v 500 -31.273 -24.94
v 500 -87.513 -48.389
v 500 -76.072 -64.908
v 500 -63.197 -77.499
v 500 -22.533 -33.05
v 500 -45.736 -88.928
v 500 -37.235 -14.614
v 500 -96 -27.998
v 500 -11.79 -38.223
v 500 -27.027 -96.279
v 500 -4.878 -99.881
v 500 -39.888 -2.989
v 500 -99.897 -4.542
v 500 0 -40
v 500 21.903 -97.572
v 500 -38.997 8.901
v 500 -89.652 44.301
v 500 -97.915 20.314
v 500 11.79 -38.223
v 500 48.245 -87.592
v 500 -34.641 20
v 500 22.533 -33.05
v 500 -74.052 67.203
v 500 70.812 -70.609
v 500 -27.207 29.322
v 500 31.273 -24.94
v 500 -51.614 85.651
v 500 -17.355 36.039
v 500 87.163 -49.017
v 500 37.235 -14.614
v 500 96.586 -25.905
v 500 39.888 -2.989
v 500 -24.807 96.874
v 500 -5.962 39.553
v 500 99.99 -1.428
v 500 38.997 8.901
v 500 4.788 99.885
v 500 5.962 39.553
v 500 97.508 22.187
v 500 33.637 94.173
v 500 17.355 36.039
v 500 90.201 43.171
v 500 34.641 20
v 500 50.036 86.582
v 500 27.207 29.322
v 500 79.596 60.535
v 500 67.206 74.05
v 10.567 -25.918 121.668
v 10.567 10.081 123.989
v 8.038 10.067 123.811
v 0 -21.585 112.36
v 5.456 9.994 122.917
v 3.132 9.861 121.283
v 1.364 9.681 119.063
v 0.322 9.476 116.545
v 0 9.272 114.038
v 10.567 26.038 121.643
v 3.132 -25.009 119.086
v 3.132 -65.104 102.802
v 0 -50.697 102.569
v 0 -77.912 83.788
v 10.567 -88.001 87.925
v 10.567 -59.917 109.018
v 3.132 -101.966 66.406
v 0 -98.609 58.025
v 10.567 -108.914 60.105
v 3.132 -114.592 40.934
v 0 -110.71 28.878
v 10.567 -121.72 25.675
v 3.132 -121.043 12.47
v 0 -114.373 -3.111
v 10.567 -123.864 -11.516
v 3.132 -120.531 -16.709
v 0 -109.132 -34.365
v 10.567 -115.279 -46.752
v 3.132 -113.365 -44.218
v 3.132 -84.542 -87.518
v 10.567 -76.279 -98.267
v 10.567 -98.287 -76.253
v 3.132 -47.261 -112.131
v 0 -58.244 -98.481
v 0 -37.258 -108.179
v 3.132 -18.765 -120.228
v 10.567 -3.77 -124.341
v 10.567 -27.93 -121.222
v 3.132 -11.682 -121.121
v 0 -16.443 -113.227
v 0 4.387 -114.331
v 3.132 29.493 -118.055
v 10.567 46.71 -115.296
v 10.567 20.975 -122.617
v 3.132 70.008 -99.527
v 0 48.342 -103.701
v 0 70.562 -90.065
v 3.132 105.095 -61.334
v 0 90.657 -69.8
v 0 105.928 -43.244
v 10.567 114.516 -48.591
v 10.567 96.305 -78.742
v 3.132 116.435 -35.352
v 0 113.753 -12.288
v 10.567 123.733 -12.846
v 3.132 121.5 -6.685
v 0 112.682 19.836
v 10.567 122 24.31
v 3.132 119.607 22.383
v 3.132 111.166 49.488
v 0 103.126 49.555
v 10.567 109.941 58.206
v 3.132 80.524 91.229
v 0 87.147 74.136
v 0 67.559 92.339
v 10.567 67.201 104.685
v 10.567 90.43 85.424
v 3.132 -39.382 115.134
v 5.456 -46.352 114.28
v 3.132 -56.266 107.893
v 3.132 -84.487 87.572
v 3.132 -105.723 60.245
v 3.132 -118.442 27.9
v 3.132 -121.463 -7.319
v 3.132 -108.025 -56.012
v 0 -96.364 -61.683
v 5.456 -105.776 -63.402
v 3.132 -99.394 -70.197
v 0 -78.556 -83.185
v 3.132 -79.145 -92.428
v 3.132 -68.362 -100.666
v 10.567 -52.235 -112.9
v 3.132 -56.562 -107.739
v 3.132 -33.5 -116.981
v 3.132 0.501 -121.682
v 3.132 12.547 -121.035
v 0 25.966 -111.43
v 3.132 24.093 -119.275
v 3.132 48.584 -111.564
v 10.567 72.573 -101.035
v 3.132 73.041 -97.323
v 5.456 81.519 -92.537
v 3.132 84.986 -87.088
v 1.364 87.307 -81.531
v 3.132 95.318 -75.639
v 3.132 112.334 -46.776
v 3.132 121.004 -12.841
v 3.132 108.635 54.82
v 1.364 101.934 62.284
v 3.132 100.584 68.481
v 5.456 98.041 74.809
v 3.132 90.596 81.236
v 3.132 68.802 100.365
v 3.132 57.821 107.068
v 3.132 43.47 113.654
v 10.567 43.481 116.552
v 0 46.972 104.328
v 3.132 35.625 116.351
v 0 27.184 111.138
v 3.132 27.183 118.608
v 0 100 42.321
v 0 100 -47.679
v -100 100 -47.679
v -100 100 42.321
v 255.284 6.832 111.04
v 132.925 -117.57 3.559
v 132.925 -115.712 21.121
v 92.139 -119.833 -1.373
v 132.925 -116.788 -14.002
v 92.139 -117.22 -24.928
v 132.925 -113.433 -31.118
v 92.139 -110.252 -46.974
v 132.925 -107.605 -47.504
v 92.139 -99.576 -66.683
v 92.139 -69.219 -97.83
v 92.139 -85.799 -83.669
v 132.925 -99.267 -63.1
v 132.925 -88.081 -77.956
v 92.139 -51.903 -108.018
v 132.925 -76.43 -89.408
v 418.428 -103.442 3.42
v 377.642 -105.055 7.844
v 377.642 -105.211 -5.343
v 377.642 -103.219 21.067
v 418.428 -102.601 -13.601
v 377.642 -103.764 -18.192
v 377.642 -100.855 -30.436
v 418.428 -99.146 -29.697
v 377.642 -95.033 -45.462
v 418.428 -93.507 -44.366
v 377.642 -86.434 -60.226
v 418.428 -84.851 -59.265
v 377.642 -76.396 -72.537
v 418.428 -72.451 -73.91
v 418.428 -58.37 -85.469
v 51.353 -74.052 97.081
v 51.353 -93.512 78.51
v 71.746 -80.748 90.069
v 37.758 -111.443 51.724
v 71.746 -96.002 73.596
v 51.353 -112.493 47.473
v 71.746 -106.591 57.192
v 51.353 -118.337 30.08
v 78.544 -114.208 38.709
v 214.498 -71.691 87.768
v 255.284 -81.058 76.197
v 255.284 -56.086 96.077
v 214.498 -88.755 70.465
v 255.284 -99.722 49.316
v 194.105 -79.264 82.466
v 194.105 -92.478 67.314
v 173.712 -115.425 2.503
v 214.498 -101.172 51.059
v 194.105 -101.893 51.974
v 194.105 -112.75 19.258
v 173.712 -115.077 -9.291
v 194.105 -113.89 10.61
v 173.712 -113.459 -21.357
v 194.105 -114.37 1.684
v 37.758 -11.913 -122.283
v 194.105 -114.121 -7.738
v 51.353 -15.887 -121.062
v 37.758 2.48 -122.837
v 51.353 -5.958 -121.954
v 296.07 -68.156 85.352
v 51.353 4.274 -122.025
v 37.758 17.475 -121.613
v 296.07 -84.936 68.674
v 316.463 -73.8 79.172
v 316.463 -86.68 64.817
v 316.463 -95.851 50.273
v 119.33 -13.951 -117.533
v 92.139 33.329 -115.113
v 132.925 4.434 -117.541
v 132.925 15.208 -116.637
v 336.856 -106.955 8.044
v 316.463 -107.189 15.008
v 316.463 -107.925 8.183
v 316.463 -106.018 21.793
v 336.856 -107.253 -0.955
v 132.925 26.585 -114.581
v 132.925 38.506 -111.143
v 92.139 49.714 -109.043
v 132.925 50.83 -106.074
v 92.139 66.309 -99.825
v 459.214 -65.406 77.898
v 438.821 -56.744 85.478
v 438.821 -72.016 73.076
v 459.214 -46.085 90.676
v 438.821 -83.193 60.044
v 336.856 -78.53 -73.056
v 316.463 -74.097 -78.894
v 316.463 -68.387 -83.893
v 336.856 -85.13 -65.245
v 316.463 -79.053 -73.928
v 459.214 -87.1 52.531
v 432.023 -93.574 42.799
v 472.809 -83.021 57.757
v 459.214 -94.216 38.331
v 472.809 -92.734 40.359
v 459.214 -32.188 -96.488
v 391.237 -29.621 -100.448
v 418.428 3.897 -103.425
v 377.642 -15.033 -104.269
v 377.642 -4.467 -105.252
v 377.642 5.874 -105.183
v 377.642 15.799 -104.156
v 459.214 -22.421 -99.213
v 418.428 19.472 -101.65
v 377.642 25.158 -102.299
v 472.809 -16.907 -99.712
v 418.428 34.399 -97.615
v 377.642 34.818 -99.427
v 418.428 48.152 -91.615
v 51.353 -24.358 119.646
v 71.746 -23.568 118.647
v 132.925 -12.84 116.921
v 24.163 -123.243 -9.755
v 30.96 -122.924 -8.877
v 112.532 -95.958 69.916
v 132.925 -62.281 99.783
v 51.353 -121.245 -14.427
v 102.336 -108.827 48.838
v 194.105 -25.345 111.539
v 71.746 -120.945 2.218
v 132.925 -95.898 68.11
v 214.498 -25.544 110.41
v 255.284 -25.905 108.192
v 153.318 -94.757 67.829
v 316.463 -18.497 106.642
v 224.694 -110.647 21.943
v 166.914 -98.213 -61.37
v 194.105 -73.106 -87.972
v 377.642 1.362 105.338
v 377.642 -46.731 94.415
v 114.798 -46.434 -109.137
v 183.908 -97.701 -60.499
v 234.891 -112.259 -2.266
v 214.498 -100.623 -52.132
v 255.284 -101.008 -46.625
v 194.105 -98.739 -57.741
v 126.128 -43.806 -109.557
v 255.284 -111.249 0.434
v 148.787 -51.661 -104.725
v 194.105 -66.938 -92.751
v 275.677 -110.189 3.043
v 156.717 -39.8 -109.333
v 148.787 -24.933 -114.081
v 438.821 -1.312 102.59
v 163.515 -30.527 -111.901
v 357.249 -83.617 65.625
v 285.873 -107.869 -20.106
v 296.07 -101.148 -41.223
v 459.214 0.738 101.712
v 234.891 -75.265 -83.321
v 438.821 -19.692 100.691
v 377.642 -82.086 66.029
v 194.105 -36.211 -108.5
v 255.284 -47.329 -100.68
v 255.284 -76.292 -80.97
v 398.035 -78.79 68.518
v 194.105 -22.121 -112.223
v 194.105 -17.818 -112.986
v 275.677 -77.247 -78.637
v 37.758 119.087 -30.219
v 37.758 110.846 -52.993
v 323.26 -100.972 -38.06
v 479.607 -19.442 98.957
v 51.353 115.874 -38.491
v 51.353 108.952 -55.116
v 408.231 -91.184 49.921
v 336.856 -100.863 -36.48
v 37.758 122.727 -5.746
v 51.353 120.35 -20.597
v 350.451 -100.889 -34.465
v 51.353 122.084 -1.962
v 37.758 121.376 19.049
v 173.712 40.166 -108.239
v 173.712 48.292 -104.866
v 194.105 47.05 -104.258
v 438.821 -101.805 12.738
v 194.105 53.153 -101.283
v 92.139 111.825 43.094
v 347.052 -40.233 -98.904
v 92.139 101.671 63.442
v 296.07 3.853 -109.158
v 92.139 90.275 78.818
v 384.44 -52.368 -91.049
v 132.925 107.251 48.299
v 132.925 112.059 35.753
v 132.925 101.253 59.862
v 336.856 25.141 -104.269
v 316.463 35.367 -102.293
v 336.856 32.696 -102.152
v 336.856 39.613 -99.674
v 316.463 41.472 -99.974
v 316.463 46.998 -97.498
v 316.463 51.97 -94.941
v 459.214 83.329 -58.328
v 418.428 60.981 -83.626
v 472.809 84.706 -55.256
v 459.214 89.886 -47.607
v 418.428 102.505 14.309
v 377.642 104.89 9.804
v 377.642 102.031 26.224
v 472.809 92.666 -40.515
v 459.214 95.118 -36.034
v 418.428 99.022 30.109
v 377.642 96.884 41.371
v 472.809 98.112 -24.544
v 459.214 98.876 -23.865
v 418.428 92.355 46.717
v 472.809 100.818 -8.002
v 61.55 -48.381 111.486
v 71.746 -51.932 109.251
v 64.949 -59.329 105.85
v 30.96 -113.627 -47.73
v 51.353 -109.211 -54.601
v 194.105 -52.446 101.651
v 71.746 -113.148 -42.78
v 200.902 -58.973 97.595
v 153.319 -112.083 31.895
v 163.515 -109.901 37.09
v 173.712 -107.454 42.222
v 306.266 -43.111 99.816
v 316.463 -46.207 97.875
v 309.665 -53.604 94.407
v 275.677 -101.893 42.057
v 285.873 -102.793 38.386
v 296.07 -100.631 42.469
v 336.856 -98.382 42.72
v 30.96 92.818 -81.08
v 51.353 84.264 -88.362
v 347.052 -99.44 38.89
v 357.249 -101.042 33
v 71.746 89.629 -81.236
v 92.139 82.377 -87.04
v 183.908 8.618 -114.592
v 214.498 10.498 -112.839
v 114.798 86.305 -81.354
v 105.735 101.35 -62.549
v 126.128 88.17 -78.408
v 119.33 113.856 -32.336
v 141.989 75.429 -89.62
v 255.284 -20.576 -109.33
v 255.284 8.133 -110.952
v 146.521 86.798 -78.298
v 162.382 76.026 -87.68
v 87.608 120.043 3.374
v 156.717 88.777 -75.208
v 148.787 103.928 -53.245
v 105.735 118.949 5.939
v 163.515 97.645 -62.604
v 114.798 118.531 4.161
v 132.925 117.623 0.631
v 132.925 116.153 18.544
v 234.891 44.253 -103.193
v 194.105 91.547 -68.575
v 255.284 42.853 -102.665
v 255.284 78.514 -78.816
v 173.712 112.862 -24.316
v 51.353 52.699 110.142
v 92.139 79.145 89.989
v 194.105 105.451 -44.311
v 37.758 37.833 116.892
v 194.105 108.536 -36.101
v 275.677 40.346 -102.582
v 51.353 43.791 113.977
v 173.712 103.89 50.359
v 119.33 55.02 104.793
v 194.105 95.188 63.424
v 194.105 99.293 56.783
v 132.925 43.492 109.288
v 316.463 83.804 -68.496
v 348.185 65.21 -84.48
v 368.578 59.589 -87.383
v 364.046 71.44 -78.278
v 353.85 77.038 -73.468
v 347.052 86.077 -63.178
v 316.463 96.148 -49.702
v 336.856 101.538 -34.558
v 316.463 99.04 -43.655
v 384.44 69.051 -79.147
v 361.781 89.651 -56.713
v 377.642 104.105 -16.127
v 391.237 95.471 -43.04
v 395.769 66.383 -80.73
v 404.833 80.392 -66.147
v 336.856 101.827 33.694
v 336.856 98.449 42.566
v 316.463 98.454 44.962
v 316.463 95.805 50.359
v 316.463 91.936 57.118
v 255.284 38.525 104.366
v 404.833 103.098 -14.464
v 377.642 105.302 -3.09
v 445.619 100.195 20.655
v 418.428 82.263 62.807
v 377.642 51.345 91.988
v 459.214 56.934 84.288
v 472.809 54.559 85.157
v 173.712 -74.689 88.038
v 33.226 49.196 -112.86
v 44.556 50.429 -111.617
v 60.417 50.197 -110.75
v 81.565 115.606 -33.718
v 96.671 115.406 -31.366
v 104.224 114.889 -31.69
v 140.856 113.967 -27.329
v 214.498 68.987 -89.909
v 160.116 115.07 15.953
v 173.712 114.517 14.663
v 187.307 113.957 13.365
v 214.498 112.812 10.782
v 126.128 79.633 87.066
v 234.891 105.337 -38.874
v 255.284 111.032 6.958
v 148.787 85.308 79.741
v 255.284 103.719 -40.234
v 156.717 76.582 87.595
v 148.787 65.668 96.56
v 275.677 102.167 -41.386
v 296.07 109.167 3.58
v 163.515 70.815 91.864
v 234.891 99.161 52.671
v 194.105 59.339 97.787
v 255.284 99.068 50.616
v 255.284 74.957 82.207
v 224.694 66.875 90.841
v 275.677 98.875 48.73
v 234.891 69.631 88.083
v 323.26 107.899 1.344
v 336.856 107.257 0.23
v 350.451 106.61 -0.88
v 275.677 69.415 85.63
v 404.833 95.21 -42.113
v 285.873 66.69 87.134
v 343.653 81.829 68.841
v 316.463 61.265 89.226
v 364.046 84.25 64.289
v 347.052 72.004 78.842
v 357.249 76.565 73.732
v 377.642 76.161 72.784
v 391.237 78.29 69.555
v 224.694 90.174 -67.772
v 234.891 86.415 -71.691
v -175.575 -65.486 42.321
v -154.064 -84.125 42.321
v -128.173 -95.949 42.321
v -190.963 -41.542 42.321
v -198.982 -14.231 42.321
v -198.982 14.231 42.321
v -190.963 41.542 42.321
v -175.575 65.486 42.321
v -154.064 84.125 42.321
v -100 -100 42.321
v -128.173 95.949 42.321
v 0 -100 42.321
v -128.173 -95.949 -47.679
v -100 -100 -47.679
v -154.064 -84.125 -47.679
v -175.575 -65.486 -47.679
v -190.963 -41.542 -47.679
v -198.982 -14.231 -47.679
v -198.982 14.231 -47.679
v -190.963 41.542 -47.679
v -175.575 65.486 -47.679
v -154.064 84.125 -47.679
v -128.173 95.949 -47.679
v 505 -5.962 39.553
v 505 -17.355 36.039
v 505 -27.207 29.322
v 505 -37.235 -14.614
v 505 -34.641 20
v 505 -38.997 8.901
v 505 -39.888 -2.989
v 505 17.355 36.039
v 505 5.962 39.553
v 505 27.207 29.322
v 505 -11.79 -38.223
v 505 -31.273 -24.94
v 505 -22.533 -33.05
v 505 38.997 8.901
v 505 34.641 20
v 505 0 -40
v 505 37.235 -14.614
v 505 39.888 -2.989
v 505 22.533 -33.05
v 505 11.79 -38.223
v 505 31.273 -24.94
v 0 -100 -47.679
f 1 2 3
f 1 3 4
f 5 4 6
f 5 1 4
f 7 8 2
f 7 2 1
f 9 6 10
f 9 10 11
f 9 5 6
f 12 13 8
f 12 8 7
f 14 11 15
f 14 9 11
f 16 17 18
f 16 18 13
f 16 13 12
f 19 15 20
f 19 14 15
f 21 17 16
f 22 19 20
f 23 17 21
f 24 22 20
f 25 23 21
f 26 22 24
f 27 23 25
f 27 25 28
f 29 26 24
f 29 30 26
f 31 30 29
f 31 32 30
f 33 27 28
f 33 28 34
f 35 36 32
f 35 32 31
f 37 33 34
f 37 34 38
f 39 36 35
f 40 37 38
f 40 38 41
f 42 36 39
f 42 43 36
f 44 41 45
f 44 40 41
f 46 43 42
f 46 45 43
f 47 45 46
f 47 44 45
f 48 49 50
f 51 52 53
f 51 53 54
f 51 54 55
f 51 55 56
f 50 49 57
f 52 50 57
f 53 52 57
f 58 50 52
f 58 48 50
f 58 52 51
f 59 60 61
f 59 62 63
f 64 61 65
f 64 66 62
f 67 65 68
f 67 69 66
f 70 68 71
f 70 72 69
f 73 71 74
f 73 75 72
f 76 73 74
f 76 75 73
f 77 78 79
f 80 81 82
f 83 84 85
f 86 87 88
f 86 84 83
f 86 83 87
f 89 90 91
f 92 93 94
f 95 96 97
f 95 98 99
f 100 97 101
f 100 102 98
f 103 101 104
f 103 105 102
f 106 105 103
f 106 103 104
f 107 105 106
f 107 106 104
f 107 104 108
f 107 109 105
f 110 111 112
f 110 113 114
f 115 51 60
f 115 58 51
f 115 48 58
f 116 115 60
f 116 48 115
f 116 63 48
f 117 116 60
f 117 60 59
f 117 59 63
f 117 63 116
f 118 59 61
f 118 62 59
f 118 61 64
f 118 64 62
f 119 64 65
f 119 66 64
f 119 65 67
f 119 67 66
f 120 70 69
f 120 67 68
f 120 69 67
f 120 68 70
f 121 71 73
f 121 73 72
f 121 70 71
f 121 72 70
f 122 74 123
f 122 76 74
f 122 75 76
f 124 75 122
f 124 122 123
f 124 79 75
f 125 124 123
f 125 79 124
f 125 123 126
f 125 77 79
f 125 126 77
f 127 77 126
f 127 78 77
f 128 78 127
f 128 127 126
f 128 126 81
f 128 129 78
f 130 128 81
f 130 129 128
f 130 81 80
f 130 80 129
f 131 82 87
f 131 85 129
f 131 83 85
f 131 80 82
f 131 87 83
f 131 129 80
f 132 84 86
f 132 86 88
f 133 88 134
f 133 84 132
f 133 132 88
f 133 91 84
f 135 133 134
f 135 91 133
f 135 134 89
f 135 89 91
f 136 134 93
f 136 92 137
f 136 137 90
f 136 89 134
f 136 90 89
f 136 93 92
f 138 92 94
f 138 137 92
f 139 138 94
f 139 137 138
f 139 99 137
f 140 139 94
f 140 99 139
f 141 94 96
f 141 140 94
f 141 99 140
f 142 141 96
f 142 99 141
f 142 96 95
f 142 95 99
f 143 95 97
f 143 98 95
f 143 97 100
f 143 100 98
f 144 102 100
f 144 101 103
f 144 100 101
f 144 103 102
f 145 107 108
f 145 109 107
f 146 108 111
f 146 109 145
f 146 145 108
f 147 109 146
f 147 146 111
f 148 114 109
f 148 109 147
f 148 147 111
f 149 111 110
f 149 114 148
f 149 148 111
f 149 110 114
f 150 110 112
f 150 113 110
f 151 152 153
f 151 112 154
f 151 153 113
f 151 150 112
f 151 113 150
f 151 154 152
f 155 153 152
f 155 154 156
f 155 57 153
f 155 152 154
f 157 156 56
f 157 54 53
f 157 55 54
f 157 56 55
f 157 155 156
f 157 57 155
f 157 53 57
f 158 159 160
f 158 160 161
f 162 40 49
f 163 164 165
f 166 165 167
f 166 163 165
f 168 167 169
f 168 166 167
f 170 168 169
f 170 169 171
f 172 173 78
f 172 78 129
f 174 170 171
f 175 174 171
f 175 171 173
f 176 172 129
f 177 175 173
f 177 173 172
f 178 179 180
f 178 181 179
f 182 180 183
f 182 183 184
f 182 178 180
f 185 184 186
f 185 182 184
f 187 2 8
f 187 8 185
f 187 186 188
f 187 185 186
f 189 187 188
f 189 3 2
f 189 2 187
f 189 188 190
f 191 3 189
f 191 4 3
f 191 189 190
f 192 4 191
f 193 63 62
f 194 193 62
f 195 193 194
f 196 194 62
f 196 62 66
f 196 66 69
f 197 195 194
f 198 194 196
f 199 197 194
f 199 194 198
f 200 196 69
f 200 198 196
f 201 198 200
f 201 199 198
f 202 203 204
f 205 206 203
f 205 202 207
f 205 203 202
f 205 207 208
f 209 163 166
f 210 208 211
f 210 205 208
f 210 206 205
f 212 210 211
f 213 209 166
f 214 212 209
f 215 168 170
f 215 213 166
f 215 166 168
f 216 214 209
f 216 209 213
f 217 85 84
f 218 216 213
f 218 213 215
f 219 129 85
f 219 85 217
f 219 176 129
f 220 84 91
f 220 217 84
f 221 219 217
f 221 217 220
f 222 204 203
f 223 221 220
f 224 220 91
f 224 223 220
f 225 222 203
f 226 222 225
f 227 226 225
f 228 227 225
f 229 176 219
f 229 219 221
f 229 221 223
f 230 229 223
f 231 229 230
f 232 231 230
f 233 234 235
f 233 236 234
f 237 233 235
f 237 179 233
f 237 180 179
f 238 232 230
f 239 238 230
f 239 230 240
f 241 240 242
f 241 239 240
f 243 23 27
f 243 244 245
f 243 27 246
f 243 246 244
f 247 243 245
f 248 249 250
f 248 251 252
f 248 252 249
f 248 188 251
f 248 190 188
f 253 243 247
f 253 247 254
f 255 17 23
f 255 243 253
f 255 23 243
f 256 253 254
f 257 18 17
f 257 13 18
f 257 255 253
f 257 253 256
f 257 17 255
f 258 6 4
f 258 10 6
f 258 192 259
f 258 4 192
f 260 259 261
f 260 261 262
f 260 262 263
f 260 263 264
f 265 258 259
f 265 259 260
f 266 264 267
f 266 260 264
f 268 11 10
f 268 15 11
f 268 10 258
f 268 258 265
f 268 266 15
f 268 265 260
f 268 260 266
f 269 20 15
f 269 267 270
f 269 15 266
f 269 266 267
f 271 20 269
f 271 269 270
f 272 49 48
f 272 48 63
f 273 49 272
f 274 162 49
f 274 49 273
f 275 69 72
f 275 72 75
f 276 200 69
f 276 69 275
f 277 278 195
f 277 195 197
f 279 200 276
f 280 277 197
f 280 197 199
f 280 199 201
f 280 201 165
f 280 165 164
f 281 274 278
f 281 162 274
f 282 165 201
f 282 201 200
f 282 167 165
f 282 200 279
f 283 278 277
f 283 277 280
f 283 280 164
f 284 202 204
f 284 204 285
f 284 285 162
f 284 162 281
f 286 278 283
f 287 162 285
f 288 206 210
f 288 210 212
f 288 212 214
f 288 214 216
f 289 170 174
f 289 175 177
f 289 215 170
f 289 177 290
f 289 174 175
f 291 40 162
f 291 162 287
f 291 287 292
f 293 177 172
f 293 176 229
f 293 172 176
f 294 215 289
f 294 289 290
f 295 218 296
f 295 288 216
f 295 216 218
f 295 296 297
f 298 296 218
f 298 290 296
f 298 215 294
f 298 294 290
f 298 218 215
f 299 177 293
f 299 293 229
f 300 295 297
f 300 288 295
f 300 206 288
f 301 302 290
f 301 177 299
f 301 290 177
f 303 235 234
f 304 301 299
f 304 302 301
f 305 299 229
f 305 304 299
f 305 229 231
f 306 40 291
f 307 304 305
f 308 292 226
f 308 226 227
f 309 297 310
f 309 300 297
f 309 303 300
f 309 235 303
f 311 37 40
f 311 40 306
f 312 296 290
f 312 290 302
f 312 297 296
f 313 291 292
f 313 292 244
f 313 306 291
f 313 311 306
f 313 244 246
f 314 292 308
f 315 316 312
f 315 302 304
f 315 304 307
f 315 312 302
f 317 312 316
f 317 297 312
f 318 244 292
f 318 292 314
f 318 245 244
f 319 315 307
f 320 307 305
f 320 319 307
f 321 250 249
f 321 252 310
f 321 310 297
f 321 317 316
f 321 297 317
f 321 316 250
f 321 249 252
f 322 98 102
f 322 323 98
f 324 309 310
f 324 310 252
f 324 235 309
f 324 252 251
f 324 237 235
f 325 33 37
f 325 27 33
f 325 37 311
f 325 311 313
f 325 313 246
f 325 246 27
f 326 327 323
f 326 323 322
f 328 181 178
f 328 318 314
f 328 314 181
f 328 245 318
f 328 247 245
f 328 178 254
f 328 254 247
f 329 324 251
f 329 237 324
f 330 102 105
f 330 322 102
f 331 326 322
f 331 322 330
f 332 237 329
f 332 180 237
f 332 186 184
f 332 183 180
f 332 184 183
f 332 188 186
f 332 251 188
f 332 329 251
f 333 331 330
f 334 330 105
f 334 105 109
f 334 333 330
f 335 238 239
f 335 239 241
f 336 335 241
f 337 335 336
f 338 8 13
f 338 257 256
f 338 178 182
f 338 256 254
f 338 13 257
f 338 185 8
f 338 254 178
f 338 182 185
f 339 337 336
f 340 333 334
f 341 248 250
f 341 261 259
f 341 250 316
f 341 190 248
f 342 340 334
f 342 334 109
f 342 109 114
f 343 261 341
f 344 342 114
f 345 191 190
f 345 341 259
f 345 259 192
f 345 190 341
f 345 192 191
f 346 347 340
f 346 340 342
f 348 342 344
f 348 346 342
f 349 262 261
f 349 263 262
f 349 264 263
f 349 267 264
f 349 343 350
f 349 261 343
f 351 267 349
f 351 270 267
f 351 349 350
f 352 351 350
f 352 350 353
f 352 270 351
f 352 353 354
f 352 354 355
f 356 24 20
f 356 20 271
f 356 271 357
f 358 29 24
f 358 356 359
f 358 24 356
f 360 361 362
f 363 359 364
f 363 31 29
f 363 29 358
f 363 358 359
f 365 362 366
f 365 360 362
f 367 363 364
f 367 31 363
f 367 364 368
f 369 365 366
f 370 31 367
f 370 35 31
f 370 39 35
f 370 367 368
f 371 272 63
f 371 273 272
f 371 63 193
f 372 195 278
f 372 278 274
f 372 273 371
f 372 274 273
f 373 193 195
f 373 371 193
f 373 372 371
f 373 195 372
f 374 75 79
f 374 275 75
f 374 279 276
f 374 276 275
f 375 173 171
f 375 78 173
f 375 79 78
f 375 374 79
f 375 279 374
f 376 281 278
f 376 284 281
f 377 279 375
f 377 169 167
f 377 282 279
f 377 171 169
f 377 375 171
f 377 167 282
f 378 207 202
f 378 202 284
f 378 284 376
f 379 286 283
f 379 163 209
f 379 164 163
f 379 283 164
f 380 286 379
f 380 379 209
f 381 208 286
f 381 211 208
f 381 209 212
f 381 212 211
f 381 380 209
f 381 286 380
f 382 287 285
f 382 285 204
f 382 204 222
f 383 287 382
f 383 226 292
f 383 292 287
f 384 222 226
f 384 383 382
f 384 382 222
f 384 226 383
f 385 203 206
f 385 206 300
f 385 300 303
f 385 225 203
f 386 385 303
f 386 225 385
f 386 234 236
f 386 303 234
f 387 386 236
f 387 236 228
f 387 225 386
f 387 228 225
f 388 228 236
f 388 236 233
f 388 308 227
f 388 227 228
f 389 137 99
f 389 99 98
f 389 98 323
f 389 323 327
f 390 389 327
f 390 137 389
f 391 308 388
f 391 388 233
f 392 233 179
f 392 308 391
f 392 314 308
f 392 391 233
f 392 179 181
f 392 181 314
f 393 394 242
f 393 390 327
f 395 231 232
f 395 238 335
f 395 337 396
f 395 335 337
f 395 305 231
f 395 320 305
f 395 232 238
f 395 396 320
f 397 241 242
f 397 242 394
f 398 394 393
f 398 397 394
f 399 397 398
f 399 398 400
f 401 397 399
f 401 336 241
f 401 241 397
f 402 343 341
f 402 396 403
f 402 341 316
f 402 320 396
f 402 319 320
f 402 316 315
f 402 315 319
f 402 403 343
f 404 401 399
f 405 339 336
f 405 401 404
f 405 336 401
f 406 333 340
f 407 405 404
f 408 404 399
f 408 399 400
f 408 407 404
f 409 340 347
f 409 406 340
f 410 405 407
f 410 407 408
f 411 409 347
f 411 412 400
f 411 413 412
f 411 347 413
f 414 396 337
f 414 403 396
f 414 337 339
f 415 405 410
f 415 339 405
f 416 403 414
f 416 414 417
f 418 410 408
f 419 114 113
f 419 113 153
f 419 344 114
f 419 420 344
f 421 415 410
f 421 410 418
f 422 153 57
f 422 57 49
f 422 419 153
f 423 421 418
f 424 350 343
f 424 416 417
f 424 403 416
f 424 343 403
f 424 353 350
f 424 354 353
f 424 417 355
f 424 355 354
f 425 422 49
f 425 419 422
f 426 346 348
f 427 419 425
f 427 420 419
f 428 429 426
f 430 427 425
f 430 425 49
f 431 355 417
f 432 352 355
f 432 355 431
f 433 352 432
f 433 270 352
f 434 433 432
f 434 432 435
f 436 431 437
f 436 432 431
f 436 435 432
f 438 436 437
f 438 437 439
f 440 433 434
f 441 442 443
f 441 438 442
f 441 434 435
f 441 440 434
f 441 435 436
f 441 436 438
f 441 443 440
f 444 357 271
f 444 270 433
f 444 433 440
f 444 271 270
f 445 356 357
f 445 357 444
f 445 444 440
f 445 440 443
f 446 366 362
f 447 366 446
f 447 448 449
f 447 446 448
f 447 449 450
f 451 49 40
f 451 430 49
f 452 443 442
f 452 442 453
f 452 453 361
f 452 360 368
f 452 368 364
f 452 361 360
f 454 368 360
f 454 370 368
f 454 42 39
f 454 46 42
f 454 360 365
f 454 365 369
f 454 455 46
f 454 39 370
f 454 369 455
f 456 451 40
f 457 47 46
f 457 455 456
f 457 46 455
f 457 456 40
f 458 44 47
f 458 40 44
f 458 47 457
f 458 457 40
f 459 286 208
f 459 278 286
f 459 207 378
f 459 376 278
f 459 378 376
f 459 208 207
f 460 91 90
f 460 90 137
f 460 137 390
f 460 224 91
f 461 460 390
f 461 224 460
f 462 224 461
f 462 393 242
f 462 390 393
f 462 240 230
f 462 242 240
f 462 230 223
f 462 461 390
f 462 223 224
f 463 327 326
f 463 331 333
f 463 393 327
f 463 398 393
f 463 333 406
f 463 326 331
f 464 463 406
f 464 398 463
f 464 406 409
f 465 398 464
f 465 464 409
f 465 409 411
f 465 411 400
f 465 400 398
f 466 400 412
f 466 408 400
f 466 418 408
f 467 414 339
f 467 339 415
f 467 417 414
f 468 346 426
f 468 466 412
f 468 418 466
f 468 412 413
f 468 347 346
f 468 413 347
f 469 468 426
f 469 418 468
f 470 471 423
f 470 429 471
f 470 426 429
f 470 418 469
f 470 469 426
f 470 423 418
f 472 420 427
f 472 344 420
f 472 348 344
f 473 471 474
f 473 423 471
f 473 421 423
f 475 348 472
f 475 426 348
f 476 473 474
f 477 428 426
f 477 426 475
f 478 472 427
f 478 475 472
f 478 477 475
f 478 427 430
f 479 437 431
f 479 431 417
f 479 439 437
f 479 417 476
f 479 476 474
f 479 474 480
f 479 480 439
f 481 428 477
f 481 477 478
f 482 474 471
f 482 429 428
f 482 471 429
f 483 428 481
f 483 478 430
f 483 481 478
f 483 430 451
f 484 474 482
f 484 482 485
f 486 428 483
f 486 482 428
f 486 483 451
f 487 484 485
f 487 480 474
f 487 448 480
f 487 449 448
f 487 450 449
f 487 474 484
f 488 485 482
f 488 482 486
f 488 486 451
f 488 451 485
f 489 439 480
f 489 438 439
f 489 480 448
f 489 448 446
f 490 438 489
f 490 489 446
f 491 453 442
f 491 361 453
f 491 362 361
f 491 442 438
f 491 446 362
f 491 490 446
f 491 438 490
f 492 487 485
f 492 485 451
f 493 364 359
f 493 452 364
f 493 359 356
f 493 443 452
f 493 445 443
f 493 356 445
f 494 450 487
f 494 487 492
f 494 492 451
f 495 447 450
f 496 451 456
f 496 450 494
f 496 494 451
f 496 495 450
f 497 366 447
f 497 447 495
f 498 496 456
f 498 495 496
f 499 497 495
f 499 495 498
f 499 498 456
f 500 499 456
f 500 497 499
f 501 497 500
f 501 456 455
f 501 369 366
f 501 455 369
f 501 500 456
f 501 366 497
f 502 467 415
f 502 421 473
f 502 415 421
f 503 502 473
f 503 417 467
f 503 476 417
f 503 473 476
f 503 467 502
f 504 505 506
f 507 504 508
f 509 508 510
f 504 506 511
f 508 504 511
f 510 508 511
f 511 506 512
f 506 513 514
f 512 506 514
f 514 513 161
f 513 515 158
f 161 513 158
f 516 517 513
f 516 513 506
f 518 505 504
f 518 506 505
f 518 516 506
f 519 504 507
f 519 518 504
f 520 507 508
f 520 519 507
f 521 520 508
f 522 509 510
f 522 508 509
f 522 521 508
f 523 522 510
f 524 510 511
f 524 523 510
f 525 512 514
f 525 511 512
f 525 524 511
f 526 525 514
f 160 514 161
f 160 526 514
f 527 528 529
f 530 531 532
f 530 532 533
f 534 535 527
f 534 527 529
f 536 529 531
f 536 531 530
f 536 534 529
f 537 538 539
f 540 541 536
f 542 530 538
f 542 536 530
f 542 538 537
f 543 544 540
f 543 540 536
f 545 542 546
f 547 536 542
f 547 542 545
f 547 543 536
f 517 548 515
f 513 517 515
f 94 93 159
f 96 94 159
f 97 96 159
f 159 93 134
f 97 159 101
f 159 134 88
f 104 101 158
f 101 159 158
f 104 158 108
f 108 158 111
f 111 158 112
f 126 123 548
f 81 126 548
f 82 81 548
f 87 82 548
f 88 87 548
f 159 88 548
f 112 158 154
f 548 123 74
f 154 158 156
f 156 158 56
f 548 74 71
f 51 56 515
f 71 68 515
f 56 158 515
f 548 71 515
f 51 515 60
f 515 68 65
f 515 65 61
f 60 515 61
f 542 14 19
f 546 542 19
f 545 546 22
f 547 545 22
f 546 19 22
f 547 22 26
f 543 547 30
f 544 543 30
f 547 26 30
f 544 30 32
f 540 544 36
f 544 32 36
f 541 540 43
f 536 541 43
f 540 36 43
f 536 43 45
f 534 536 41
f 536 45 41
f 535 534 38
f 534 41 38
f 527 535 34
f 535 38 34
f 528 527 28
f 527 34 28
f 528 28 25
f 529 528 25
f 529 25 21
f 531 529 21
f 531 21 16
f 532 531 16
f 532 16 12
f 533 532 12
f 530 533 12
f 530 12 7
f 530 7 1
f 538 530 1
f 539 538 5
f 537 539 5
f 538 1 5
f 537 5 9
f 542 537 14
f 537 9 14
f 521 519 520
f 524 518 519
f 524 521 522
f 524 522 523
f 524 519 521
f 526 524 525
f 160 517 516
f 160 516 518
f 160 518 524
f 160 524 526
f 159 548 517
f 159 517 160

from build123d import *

# Parameters (mm, degrees)
SKETCH17_W          = 90
SKETCH17_H          = 200
BOSS_EXTRUDE2_DEPTH = 200
CUT_EXTRUDE14_DEPTH = 200
FILLET1_R           = 10
SKETCH22_R          = 40
BOSS_EXTRUDE3_DEPTH = 5


with BuildPart() as part:
    # Loft5: read off the stored shape, not the designer's step
    # Loft5: loft between two sections, ruled curve by curve
    loft5_from = [
        Edge.make_bspline([(0, 9.572476569, 124.632931813), (0, -239.693387057, 143.777884951), (0, -258.838340195, -105.487978675), (0, -9.572476569, -124.632931813), (0, 239.693387057, -143.777884951), (0, 258.838340195, 105.487978675), (0, 9.572476569, 124.632931813)], [0, 0, 0, 0, 0.5, 0.5, 0.5, 1, 1, 1, 1], 3, [1, 0.333333333, 0.333333333, 1, 0.333333333, 0.333333333, 1]),
    ]
    loft5_to = [
        Edge.make_bspline([(500, 33.637216162, 94.172913775), (500, -154.708611388, 161.447346099), (500, -221.983043712, -26.898481451), (500, -33.637216162, -94.172913775), (500, 154.708611388, -161.447346099), (500, 221.983043712, 26.898481451), (500, 33.637216162, 94.172913775)], [0, 0, 0, 0, 0.5, 0.5, 0.5, 1, 1, 1, 1], 3, [1, 0.333333333, 0.333333333, 1, 0.333333333, 0.333333333, 1]),
    ]
    loft5 = Solid(Shell([*[Face.make_surface_from_curves(loft5_from[k], loft5_to[k]) for k in range(1)], Face(Wire(loft5_from)), Face(Wire(loft5_to))]))
    add(loft5)

    # Sketch17 → Boss-Extrude2 (add)
    with BuildSketch(Plane.ZY):
        with Locations((-2.678768884, 0)):
            Rectangle(SKETCH17_W, SKETCH17_H)
    extrude(amount=BOSS_EXTRUDE2_DEPTH)

    # Sketch21 → Cut-Extrude14 (cut)
    with BuildSketch(Plane(origin=(0, 0, -47.678768884), x_dir=(-1, 0, 0), z_dir=(0, 0, -1))):
        with BuildLine():
            Line((100, 100), (100, 139.740536385))
            Line((100, 139.740536385), (237.040054467, 139.740536385))
            Line((237.040054467, 139.740536385), (237.040054467, -127.442216689))
            Line((237.040054467, -127.442216689), (100, -127.442216689))
            Line((100, -127.442216689), (100, -100))
            ThreePointArc((100, -100), (200, 0), (100, 100))
        make_face()
    extrude(amount=-CUT_EXTRUDE14_DEPTH, mode=Mode.SUBTRACT)

    # Fillet1
    fillet1_edges = [part.edges().sort_by_distance(p)[0] for p in [
        (0, -9.572476569, -124.632931813),
    ]]
    fillet(fillet1_edges, radius=FILLET1_R)

    # Sketch22 → Boss-Extrude3 (add)
    with BuildSketch(Plane(origin=(500, 0, 0), x_dir=(0, 0, -1), z_dir=(1, 0, 0))):
        Circle(SKETCH22_R)
    extrude(amount=BOSS_EXTRUDE3_DEPTH)


solid = part.part
